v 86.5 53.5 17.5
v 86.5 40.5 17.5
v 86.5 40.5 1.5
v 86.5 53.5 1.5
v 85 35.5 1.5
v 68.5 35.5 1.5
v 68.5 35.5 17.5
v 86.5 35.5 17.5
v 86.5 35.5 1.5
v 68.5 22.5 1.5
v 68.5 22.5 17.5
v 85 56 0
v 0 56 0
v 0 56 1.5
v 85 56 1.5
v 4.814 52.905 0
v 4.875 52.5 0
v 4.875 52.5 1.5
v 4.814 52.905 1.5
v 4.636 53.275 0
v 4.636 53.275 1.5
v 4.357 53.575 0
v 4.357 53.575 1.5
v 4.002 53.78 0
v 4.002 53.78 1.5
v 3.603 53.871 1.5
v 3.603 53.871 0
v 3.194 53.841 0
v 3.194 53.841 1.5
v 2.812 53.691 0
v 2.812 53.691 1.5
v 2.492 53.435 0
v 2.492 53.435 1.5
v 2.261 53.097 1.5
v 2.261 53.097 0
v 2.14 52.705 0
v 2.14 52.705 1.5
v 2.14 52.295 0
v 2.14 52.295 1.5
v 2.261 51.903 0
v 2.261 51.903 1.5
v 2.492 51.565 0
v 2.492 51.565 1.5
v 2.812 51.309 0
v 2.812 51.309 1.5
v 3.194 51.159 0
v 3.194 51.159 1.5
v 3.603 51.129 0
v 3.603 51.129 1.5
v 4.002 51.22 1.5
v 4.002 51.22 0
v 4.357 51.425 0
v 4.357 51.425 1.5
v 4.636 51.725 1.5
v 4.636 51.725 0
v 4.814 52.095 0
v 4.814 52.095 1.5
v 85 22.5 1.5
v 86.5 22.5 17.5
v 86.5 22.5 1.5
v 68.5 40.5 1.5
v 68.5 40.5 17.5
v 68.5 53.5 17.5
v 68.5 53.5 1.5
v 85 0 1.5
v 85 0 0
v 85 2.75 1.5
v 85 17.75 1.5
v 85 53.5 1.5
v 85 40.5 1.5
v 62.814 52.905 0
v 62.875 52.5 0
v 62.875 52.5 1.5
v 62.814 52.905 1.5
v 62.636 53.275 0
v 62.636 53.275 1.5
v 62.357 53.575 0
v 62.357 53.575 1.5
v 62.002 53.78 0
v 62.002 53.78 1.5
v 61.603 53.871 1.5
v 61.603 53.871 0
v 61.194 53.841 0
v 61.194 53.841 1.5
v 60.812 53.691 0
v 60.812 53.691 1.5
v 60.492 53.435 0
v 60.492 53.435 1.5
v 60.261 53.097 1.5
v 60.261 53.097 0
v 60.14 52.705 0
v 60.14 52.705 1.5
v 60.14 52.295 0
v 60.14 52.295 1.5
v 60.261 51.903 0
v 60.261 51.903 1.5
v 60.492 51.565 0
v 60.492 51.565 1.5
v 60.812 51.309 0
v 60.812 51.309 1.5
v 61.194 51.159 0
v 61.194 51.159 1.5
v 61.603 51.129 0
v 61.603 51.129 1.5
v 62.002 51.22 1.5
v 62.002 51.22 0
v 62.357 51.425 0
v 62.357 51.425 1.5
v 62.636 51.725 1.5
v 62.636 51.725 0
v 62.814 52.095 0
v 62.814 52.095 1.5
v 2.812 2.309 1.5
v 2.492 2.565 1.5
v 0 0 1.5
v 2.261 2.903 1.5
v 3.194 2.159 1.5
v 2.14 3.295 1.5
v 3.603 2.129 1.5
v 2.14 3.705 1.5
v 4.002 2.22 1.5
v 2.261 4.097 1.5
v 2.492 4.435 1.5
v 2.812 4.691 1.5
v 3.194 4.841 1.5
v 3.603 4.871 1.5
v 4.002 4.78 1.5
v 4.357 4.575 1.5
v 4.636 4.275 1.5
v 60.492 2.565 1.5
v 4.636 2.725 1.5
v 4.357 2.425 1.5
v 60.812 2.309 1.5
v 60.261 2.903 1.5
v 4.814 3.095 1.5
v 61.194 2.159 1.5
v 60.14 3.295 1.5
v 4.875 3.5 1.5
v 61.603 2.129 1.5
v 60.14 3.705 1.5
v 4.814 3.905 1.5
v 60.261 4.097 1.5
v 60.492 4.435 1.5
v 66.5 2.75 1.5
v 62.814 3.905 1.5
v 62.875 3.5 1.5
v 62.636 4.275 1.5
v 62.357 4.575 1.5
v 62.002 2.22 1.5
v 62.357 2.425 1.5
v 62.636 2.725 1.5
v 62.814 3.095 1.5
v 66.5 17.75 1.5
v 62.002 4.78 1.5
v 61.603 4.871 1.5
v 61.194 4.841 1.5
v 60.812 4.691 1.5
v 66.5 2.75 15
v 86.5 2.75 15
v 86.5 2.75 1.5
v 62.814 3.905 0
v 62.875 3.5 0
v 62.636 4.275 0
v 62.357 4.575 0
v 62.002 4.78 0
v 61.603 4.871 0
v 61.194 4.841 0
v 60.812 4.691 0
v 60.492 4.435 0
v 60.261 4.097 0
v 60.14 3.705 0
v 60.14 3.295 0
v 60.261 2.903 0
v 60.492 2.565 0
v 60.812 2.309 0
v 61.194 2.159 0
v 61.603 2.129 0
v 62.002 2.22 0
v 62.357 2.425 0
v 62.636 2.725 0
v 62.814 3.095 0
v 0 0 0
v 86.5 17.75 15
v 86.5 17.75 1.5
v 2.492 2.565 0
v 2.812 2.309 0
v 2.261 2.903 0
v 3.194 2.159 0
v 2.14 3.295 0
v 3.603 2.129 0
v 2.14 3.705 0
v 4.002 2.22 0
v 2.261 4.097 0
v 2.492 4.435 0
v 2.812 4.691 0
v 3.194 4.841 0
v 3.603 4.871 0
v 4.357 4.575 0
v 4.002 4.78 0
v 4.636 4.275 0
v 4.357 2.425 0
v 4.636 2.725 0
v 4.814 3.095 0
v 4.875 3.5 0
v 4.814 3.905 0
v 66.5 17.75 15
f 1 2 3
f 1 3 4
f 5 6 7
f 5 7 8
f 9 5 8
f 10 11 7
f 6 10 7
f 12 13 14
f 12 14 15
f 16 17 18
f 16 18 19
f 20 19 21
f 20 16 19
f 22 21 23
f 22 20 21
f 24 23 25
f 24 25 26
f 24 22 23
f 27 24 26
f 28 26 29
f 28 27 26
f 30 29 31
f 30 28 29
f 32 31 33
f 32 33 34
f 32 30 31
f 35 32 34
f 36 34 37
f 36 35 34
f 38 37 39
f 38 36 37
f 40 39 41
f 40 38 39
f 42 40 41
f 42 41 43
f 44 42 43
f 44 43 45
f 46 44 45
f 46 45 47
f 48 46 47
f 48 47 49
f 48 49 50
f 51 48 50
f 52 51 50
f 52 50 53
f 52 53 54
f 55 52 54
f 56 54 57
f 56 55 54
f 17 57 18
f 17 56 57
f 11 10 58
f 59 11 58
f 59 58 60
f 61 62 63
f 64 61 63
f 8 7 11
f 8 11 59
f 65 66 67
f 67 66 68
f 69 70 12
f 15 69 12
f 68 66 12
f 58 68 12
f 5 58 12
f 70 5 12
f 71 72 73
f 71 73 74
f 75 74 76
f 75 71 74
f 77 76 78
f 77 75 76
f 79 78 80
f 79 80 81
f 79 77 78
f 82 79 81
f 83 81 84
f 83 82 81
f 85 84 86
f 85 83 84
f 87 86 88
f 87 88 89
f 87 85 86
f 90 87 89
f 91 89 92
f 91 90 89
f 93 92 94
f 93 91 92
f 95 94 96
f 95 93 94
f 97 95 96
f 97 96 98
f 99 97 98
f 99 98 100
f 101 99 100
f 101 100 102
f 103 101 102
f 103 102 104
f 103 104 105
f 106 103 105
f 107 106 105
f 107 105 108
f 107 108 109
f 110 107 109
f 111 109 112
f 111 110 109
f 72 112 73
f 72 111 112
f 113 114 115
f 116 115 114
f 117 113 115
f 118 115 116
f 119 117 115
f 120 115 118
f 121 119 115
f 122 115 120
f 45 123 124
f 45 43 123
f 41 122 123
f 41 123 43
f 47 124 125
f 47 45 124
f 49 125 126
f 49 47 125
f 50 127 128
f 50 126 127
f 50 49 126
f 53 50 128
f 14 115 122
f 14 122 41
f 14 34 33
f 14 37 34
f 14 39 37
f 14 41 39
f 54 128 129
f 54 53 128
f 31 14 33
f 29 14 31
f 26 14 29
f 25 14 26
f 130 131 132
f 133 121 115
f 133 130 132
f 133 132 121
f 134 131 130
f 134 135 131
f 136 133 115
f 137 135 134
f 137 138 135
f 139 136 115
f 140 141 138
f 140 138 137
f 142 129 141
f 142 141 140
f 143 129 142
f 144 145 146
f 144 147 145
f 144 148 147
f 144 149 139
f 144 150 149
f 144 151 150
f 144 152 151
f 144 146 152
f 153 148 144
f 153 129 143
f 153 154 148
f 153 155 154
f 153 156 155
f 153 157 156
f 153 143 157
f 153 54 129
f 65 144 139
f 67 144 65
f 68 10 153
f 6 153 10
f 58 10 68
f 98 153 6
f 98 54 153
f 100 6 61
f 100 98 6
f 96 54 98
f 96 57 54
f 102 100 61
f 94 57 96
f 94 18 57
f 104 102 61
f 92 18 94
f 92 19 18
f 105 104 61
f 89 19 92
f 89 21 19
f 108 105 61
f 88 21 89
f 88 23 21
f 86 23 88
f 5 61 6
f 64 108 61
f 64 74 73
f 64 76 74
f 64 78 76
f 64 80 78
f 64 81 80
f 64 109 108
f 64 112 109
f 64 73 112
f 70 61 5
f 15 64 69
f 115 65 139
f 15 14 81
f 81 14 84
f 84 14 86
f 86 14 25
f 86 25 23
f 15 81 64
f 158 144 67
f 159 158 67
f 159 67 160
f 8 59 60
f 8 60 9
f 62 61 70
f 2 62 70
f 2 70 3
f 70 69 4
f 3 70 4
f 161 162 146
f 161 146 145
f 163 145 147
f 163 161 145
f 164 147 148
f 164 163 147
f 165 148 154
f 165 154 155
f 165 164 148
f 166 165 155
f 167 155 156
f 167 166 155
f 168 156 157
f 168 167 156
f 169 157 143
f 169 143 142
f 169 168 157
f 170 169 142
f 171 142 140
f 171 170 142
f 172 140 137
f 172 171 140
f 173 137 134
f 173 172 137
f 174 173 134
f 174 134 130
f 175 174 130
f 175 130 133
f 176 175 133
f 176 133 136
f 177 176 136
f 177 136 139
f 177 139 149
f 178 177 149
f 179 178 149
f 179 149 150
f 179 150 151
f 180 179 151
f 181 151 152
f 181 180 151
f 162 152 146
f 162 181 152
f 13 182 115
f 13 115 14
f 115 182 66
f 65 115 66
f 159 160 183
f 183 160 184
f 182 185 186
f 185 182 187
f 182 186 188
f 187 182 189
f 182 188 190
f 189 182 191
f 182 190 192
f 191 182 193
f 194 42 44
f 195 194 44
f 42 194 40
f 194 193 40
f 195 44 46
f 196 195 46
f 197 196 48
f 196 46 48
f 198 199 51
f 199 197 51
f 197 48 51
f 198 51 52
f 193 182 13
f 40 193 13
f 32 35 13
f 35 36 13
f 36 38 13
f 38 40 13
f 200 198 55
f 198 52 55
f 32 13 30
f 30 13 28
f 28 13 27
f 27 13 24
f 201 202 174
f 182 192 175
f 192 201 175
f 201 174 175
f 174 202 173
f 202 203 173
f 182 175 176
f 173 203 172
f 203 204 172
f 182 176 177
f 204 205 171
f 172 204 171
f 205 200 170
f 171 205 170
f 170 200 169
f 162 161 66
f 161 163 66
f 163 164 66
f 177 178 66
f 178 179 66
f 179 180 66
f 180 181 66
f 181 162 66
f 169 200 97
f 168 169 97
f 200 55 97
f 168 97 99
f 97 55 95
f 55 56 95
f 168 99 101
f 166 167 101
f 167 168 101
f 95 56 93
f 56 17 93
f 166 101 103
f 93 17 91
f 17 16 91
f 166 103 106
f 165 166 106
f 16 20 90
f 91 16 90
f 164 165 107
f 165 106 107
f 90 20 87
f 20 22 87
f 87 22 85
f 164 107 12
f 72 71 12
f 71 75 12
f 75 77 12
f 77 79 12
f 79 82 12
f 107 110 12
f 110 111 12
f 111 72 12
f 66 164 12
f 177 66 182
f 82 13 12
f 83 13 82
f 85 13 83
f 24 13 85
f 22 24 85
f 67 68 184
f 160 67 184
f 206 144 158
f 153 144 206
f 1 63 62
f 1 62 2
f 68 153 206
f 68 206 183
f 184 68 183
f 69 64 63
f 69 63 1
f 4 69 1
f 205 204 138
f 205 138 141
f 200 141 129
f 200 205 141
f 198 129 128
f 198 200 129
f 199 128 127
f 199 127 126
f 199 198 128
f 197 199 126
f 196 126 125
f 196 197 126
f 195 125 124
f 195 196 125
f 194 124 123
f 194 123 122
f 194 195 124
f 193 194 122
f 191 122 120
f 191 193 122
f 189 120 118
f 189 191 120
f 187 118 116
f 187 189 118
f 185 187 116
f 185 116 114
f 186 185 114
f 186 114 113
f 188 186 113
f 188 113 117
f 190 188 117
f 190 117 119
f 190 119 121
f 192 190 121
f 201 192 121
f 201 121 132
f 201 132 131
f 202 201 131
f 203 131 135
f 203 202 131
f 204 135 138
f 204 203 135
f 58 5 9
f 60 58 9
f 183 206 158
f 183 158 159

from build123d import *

# Parameters (mm, degrees)
F0_W     = 85
F0_H     = 56
F0_R     = 1.375
F1_DEPTH = 1.5
F3_W     = 18
F3_H     = 13
F4_DEPTH = 16
F3_W_2   = 20
F3_H_2   = 15
F5_DEPTH = 13.5


# Not quite as in the source:
# - a feature names something its author has since deleted; it is built from what else it names


with BuildPart() as f1:
    # F0 (on Top) → F1 (new body)
    with BuildSketch(Plane.XY):
        with Locations((42.5, 28)):
            Rectangle(F0_W, F0_H)
        with Locations((3.5, 3.5)):
            Circle(F0_R, mode=Mode.SUBTRACT)
        with Locations((61.5, 3.5)):
            Circle(F0_R, mode=Mode.SUBTRACT)
        with Locations((3.5, 52.5)):
            Circle(F0_R, mode=Mode.SUBTRACT)
        with Locations((61.5, 52.5)):
            Circle(F0_R, mode=Mode.SUBTRACT)
    extrude(amount=F1_DEPTH)

    # F3 (on offset) → F4 (join)
    with BuildSketch(Plane.XY.offset(1.5)):
        with Locations((77.5, 47)):
            Rectangle(F3_W, F3_H)
        with Locations((77.5, 29)):
            Rectangle(F3_W, F3_H)
    extrude(amount=F4_DEPTH)

    # F3 (on offset) → F5 (join)
    with BuildSketch(Plane.XY.offset(1.5)):
        with Locations((76.5, 10.25)):
            Rectangle(F3_W_2, F3_H_2)
    extrude(amount=F5_DEPTH)


solid = f1.part
